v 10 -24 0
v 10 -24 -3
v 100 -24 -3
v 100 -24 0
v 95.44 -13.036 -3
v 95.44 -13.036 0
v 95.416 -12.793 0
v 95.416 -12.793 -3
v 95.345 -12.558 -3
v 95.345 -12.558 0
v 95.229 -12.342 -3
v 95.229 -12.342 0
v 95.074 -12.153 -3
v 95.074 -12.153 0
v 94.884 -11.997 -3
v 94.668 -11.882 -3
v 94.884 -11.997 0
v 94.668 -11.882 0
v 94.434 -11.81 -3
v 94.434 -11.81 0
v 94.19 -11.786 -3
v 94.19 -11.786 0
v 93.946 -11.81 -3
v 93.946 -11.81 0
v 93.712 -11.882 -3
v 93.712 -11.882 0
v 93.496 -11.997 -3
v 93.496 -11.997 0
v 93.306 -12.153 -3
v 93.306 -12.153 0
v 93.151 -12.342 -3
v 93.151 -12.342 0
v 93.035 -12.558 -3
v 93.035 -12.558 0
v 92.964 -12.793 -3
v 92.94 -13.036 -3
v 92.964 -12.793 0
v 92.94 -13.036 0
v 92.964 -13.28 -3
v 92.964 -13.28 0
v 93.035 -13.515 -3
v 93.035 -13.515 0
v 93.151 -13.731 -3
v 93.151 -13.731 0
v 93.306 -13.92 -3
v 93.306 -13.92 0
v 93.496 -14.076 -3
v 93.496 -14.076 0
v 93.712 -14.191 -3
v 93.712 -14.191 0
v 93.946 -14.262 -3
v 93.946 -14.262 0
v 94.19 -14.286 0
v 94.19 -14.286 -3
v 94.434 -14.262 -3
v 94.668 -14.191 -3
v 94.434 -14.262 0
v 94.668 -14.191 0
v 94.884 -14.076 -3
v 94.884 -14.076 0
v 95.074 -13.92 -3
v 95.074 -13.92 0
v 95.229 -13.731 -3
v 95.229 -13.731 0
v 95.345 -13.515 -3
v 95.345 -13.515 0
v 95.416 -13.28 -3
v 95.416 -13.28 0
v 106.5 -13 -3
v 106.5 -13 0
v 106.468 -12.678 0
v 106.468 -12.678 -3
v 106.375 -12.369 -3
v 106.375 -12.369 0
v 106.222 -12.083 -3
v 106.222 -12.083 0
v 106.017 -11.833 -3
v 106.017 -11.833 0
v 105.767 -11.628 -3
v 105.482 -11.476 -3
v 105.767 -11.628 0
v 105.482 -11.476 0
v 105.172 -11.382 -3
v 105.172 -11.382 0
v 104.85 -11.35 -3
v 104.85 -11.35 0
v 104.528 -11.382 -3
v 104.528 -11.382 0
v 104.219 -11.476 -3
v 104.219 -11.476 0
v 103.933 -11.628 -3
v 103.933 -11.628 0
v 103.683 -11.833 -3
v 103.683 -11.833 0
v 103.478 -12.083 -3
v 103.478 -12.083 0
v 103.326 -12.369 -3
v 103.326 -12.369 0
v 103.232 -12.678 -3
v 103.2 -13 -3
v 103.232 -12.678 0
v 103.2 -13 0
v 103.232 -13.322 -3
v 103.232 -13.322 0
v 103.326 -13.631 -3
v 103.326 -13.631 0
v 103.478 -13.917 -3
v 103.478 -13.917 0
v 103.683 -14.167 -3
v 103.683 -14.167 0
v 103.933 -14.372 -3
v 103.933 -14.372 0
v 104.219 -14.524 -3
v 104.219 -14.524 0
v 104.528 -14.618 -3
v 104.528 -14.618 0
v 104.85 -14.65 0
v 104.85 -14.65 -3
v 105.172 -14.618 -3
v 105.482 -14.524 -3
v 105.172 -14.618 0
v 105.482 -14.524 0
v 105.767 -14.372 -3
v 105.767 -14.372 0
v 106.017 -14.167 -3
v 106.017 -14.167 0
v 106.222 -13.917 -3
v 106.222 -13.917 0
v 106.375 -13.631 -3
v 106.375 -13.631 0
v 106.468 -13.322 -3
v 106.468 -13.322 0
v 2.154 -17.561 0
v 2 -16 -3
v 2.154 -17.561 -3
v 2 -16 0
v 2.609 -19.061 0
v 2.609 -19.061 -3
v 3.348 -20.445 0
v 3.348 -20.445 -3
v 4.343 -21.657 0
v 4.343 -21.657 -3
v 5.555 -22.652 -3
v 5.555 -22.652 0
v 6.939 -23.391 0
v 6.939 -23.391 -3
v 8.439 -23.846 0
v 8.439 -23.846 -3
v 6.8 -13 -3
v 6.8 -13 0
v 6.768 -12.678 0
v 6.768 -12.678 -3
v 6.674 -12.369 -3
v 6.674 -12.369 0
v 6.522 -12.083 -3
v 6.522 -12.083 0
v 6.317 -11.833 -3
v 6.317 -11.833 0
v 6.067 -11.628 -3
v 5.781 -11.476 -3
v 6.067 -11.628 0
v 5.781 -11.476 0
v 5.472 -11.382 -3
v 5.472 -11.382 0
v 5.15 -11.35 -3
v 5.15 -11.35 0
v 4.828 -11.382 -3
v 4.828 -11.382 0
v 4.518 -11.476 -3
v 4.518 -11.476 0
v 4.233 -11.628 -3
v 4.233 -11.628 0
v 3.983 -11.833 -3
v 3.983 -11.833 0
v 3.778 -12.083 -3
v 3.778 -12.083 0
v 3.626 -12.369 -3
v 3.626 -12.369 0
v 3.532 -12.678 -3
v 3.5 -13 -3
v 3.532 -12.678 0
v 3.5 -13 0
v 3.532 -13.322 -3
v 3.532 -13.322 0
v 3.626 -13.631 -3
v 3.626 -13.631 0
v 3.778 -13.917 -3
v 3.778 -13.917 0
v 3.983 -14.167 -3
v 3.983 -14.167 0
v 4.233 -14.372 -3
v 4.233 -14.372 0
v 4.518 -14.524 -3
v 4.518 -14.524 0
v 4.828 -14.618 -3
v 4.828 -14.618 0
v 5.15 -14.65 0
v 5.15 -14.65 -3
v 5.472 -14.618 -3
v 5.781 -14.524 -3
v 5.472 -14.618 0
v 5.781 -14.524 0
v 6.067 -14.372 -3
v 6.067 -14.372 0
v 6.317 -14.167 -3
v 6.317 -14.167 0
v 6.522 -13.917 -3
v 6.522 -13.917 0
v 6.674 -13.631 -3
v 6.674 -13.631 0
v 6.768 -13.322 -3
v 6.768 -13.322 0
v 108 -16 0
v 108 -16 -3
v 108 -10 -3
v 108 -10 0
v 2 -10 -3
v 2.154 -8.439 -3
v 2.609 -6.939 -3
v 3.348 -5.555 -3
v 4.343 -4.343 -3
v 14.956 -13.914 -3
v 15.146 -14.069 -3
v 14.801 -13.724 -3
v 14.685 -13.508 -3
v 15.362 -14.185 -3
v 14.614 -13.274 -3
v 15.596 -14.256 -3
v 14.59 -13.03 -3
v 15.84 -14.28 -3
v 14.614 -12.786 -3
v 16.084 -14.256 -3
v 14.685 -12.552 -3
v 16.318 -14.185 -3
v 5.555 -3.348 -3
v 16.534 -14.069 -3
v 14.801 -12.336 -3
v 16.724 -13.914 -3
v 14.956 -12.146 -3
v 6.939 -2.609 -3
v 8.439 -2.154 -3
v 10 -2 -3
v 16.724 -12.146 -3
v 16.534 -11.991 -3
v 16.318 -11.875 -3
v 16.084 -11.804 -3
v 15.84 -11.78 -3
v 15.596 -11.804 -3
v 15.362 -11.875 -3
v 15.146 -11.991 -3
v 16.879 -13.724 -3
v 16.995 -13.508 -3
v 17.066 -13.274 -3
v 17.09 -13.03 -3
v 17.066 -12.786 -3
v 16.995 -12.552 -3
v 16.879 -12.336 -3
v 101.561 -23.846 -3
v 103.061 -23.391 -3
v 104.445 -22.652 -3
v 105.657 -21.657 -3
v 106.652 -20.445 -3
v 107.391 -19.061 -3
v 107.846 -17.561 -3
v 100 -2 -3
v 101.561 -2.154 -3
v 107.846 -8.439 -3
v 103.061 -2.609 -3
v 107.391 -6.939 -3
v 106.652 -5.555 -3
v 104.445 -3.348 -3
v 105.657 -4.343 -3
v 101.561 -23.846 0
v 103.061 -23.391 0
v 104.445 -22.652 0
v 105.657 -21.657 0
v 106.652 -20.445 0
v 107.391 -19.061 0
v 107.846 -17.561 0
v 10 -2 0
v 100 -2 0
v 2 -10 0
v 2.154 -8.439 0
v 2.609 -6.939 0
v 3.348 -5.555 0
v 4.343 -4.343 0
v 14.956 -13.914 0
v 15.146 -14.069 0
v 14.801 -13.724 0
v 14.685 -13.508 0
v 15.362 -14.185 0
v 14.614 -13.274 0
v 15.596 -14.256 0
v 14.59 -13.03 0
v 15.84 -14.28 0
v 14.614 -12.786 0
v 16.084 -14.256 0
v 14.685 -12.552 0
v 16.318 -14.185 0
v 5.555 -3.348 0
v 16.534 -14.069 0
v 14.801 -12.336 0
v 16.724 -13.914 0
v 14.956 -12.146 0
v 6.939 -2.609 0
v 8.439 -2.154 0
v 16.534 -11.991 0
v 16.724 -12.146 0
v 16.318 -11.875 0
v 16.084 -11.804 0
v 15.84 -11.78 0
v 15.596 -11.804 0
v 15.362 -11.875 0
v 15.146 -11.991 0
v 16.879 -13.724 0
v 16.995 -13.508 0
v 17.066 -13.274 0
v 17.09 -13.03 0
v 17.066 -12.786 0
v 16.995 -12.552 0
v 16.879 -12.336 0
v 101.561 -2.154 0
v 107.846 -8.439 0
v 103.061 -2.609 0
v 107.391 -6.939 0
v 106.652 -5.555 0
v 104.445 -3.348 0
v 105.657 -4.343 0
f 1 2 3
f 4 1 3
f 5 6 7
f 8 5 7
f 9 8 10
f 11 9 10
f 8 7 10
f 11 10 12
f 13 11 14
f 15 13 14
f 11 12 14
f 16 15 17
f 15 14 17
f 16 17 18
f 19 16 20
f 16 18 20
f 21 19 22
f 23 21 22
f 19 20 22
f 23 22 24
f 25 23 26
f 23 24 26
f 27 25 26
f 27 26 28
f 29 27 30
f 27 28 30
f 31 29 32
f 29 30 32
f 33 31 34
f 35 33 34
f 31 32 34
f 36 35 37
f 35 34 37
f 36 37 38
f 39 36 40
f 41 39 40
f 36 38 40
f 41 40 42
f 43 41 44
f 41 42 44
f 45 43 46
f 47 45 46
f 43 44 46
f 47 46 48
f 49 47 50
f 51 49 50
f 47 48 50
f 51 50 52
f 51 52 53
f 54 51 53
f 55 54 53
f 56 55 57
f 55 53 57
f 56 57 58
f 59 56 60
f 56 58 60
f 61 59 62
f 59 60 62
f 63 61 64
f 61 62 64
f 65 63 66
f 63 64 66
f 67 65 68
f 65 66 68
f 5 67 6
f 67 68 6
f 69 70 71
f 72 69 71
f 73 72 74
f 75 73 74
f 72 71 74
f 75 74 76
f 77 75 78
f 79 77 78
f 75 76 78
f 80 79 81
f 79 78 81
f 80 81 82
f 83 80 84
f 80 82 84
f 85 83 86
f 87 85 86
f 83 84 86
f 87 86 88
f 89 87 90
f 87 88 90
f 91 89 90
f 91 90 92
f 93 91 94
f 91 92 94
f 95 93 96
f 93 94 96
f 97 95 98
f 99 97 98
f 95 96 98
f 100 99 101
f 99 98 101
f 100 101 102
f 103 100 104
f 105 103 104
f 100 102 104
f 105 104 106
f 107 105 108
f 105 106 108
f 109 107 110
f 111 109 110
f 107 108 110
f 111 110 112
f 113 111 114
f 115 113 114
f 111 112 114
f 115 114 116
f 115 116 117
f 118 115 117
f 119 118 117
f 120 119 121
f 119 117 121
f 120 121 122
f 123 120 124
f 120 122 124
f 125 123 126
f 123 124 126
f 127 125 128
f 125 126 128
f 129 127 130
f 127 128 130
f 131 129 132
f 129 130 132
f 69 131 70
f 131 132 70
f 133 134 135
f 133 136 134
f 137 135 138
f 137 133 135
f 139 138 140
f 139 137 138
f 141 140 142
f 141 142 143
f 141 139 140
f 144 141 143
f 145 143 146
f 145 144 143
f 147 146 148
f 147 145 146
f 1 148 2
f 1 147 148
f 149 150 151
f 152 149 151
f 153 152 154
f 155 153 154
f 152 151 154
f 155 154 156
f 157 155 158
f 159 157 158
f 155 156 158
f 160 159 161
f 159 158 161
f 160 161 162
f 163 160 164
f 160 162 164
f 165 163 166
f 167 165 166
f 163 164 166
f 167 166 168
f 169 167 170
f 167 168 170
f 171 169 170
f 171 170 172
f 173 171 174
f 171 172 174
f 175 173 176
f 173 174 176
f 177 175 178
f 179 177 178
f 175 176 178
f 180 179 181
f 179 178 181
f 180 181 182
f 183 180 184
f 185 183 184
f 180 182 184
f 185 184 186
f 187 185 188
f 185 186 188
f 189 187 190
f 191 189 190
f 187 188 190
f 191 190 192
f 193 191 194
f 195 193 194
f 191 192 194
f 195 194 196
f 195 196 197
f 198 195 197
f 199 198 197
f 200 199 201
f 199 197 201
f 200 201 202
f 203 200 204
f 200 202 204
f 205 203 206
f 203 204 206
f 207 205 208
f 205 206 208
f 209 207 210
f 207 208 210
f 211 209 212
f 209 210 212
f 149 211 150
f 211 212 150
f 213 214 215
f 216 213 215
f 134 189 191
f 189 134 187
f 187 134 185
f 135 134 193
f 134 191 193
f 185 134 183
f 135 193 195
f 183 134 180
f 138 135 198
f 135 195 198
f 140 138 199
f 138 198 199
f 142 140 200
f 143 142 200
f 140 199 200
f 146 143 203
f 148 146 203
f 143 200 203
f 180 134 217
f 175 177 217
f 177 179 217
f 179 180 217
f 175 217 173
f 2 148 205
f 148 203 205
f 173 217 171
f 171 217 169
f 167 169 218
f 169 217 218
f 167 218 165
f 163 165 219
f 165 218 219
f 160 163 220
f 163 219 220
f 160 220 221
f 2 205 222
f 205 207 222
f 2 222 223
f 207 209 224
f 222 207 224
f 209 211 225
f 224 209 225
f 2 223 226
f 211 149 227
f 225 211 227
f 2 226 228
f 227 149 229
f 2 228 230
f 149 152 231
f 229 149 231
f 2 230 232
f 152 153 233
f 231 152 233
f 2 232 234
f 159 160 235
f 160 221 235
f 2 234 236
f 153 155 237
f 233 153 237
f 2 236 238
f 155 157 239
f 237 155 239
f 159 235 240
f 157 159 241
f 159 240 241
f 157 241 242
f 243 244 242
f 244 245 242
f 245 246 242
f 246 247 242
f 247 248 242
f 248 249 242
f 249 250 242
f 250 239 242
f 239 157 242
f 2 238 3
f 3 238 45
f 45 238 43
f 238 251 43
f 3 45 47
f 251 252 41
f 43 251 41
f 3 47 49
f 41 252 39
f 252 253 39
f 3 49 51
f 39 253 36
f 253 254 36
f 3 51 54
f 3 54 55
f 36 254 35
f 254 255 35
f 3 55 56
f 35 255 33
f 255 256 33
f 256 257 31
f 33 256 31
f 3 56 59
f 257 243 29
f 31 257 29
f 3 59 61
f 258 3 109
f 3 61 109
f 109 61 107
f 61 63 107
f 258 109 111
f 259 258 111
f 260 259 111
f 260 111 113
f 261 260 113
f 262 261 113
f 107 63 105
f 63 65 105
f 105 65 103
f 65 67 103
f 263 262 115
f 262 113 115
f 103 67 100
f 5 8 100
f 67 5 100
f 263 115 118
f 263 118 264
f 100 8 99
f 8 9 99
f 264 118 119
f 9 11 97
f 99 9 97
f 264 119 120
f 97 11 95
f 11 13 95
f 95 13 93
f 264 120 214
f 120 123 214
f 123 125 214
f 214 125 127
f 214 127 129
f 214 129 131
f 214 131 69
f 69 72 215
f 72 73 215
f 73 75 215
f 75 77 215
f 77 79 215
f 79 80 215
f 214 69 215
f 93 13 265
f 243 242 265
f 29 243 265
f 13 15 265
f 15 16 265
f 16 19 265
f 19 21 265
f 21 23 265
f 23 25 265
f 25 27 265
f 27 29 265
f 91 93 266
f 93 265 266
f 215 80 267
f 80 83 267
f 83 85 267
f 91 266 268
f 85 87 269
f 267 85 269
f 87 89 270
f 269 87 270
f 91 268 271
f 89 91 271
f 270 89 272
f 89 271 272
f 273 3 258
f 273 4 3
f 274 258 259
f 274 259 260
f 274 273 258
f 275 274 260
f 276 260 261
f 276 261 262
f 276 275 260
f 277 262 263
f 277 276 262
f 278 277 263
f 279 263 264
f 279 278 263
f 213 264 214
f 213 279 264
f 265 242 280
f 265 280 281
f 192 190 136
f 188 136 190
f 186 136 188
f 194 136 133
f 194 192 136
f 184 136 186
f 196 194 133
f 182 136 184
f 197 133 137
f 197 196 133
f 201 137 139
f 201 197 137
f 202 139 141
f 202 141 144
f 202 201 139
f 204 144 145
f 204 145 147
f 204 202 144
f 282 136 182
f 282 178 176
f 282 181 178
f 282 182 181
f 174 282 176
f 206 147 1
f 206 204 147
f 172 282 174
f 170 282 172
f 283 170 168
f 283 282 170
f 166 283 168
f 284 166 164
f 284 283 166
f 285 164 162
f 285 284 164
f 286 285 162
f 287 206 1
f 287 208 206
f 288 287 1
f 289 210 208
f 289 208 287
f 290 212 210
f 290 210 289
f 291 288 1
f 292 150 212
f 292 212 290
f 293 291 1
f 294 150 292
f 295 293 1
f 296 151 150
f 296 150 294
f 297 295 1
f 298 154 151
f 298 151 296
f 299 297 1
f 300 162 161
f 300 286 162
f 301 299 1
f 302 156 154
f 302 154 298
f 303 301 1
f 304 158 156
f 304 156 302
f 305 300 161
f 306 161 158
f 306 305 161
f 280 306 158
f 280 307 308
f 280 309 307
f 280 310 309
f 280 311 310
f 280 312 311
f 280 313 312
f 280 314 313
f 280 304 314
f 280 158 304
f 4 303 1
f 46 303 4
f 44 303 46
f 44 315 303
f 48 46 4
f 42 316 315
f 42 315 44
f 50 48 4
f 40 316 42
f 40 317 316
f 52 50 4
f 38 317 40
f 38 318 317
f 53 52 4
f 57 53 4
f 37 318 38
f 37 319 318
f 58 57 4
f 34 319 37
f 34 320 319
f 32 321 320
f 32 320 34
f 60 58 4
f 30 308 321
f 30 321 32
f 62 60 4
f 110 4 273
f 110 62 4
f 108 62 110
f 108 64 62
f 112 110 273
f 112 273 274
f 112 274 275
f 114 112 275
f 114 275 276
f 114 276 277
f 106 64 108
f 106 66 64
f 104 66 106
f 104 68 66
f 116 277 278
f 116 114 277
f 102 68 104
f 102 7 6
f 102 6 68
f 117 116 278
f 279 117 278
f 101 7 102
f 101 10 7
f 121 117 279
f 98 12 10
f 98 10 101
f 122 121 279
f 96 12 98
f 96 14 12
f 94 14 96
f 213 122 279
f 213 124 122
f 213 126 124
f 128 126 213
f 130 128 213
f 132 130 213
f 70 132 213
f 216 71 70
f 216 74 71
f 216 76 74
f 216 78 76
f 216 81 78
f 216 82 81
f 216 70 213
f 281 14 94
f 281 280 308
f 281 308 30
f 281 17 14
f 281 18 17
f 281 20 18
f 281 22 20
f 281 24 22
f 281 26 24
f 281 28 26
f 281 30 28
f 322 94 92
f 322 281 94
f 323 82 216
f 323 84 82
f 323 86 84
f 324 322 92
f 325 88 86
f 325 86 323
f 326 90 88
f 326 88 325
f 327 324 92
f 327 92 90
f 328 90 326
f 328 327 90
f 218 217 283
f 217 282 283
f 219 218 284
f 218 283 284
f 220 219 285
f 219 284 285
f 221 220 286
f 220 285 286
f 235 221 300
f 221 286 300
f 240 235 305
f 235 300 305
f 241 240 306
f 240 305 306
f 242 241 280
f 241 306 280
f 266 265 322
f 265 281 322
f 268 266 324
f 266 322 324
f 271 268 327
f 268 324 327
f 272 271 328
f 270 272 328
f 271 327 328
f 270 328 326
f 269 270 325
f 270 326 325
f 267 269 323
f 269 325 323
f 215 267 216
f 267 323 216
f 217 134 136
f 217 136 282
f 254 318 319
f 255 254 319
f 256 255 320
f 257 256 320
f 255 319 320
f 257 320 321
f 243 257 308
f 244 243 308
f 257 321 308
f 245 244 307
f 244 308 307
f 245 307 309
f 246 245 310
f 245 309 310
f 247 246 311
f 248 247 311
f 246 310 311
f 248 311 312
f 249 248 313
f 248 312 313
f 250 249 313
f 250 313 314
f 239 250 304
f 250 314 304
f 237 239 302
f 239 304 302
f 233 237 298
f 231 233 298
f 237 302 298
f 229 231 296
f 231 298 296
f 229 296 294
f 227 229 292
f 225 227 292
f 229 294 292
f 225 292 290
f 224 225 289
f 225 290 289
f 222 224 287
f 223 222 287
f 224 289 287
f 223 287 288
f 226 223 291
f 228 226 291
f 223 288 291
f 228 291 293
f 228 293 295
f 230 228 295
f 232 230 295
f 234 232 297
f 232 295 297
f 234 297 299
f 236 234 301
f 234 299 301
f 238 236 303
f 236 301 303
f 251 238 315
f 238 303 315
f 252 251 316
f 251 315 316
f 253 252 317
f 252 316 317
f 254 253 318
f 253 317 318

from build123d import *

# Parameters (mm, degrees)
SKETCH086_W     = 106
SKETCH086_H     = 22
PAD005_DEPTH    = 3
SKETCH087_R     = 1.25
POCKET003_DEPTH = 3
FILLET005_R     = 8
SKETCH088_R     = 1.65
POCKET004_DEPTH = 3


with BuildPart() as part:
    # Sketch086 → Pad005 (new body)
    with BuildSketch(Plane.XY):
        with Locations((0.609999, 10.86)):
            Rectangle(SKETCH086_W, SKETCH086_H)
    extrude(amount=PAD005_DEPTH)

    # Sketch087 → Pocket003 (cut)
    with BuildSketch(Plane.XY.offset(3)):
        with Locations((-38.549999, 10.83)):
            Circle(SKETCH087_R)
        with Locations((39.800001, 10.823599)):
            Circle(SKETCH087_R)
    extrude(amount=-POCKET003_DEPTH, mode=Mode.SUBTRACT)

    # Fillet005
    fillet005_edges = [part.edges().sort_by_distance(p)[0] for p in [
        (-52.390001, 21.86, 1.5),
        (-52.390001, -0.14, 1.5),
        (53.609999, 21.86, 1.5),
        (53.609999, -0.14, 1.5),
    ]]
    fillet(fillet005_edges, radius=FILLET005_R)

    # Sketch088 (on Face5 of Fillet005) → Pocket004 (cut)
    with BuildSketch(Plane.XY.offset(3)):
        with Locations((-49.240092, 10.86)):
            Circle(SKETCH088_R)
        with Locations((50.460174, 10.86)):
            Circle(SKETCH088_R)
    extrude(amount=-POCKET004_DEPTH, mode=Mode.SUBTRACT)


with BuildPart() as part_1:
    # Body008 placement: moved
    add(part.part.moved(Location((46.37, -59.87, 16))))


with BuildPart() as part_2:
    # Clone placement: moved
    add(part_1.part.moved(Location((8.020001, 36.01, -19))))


solid = part_2.part
